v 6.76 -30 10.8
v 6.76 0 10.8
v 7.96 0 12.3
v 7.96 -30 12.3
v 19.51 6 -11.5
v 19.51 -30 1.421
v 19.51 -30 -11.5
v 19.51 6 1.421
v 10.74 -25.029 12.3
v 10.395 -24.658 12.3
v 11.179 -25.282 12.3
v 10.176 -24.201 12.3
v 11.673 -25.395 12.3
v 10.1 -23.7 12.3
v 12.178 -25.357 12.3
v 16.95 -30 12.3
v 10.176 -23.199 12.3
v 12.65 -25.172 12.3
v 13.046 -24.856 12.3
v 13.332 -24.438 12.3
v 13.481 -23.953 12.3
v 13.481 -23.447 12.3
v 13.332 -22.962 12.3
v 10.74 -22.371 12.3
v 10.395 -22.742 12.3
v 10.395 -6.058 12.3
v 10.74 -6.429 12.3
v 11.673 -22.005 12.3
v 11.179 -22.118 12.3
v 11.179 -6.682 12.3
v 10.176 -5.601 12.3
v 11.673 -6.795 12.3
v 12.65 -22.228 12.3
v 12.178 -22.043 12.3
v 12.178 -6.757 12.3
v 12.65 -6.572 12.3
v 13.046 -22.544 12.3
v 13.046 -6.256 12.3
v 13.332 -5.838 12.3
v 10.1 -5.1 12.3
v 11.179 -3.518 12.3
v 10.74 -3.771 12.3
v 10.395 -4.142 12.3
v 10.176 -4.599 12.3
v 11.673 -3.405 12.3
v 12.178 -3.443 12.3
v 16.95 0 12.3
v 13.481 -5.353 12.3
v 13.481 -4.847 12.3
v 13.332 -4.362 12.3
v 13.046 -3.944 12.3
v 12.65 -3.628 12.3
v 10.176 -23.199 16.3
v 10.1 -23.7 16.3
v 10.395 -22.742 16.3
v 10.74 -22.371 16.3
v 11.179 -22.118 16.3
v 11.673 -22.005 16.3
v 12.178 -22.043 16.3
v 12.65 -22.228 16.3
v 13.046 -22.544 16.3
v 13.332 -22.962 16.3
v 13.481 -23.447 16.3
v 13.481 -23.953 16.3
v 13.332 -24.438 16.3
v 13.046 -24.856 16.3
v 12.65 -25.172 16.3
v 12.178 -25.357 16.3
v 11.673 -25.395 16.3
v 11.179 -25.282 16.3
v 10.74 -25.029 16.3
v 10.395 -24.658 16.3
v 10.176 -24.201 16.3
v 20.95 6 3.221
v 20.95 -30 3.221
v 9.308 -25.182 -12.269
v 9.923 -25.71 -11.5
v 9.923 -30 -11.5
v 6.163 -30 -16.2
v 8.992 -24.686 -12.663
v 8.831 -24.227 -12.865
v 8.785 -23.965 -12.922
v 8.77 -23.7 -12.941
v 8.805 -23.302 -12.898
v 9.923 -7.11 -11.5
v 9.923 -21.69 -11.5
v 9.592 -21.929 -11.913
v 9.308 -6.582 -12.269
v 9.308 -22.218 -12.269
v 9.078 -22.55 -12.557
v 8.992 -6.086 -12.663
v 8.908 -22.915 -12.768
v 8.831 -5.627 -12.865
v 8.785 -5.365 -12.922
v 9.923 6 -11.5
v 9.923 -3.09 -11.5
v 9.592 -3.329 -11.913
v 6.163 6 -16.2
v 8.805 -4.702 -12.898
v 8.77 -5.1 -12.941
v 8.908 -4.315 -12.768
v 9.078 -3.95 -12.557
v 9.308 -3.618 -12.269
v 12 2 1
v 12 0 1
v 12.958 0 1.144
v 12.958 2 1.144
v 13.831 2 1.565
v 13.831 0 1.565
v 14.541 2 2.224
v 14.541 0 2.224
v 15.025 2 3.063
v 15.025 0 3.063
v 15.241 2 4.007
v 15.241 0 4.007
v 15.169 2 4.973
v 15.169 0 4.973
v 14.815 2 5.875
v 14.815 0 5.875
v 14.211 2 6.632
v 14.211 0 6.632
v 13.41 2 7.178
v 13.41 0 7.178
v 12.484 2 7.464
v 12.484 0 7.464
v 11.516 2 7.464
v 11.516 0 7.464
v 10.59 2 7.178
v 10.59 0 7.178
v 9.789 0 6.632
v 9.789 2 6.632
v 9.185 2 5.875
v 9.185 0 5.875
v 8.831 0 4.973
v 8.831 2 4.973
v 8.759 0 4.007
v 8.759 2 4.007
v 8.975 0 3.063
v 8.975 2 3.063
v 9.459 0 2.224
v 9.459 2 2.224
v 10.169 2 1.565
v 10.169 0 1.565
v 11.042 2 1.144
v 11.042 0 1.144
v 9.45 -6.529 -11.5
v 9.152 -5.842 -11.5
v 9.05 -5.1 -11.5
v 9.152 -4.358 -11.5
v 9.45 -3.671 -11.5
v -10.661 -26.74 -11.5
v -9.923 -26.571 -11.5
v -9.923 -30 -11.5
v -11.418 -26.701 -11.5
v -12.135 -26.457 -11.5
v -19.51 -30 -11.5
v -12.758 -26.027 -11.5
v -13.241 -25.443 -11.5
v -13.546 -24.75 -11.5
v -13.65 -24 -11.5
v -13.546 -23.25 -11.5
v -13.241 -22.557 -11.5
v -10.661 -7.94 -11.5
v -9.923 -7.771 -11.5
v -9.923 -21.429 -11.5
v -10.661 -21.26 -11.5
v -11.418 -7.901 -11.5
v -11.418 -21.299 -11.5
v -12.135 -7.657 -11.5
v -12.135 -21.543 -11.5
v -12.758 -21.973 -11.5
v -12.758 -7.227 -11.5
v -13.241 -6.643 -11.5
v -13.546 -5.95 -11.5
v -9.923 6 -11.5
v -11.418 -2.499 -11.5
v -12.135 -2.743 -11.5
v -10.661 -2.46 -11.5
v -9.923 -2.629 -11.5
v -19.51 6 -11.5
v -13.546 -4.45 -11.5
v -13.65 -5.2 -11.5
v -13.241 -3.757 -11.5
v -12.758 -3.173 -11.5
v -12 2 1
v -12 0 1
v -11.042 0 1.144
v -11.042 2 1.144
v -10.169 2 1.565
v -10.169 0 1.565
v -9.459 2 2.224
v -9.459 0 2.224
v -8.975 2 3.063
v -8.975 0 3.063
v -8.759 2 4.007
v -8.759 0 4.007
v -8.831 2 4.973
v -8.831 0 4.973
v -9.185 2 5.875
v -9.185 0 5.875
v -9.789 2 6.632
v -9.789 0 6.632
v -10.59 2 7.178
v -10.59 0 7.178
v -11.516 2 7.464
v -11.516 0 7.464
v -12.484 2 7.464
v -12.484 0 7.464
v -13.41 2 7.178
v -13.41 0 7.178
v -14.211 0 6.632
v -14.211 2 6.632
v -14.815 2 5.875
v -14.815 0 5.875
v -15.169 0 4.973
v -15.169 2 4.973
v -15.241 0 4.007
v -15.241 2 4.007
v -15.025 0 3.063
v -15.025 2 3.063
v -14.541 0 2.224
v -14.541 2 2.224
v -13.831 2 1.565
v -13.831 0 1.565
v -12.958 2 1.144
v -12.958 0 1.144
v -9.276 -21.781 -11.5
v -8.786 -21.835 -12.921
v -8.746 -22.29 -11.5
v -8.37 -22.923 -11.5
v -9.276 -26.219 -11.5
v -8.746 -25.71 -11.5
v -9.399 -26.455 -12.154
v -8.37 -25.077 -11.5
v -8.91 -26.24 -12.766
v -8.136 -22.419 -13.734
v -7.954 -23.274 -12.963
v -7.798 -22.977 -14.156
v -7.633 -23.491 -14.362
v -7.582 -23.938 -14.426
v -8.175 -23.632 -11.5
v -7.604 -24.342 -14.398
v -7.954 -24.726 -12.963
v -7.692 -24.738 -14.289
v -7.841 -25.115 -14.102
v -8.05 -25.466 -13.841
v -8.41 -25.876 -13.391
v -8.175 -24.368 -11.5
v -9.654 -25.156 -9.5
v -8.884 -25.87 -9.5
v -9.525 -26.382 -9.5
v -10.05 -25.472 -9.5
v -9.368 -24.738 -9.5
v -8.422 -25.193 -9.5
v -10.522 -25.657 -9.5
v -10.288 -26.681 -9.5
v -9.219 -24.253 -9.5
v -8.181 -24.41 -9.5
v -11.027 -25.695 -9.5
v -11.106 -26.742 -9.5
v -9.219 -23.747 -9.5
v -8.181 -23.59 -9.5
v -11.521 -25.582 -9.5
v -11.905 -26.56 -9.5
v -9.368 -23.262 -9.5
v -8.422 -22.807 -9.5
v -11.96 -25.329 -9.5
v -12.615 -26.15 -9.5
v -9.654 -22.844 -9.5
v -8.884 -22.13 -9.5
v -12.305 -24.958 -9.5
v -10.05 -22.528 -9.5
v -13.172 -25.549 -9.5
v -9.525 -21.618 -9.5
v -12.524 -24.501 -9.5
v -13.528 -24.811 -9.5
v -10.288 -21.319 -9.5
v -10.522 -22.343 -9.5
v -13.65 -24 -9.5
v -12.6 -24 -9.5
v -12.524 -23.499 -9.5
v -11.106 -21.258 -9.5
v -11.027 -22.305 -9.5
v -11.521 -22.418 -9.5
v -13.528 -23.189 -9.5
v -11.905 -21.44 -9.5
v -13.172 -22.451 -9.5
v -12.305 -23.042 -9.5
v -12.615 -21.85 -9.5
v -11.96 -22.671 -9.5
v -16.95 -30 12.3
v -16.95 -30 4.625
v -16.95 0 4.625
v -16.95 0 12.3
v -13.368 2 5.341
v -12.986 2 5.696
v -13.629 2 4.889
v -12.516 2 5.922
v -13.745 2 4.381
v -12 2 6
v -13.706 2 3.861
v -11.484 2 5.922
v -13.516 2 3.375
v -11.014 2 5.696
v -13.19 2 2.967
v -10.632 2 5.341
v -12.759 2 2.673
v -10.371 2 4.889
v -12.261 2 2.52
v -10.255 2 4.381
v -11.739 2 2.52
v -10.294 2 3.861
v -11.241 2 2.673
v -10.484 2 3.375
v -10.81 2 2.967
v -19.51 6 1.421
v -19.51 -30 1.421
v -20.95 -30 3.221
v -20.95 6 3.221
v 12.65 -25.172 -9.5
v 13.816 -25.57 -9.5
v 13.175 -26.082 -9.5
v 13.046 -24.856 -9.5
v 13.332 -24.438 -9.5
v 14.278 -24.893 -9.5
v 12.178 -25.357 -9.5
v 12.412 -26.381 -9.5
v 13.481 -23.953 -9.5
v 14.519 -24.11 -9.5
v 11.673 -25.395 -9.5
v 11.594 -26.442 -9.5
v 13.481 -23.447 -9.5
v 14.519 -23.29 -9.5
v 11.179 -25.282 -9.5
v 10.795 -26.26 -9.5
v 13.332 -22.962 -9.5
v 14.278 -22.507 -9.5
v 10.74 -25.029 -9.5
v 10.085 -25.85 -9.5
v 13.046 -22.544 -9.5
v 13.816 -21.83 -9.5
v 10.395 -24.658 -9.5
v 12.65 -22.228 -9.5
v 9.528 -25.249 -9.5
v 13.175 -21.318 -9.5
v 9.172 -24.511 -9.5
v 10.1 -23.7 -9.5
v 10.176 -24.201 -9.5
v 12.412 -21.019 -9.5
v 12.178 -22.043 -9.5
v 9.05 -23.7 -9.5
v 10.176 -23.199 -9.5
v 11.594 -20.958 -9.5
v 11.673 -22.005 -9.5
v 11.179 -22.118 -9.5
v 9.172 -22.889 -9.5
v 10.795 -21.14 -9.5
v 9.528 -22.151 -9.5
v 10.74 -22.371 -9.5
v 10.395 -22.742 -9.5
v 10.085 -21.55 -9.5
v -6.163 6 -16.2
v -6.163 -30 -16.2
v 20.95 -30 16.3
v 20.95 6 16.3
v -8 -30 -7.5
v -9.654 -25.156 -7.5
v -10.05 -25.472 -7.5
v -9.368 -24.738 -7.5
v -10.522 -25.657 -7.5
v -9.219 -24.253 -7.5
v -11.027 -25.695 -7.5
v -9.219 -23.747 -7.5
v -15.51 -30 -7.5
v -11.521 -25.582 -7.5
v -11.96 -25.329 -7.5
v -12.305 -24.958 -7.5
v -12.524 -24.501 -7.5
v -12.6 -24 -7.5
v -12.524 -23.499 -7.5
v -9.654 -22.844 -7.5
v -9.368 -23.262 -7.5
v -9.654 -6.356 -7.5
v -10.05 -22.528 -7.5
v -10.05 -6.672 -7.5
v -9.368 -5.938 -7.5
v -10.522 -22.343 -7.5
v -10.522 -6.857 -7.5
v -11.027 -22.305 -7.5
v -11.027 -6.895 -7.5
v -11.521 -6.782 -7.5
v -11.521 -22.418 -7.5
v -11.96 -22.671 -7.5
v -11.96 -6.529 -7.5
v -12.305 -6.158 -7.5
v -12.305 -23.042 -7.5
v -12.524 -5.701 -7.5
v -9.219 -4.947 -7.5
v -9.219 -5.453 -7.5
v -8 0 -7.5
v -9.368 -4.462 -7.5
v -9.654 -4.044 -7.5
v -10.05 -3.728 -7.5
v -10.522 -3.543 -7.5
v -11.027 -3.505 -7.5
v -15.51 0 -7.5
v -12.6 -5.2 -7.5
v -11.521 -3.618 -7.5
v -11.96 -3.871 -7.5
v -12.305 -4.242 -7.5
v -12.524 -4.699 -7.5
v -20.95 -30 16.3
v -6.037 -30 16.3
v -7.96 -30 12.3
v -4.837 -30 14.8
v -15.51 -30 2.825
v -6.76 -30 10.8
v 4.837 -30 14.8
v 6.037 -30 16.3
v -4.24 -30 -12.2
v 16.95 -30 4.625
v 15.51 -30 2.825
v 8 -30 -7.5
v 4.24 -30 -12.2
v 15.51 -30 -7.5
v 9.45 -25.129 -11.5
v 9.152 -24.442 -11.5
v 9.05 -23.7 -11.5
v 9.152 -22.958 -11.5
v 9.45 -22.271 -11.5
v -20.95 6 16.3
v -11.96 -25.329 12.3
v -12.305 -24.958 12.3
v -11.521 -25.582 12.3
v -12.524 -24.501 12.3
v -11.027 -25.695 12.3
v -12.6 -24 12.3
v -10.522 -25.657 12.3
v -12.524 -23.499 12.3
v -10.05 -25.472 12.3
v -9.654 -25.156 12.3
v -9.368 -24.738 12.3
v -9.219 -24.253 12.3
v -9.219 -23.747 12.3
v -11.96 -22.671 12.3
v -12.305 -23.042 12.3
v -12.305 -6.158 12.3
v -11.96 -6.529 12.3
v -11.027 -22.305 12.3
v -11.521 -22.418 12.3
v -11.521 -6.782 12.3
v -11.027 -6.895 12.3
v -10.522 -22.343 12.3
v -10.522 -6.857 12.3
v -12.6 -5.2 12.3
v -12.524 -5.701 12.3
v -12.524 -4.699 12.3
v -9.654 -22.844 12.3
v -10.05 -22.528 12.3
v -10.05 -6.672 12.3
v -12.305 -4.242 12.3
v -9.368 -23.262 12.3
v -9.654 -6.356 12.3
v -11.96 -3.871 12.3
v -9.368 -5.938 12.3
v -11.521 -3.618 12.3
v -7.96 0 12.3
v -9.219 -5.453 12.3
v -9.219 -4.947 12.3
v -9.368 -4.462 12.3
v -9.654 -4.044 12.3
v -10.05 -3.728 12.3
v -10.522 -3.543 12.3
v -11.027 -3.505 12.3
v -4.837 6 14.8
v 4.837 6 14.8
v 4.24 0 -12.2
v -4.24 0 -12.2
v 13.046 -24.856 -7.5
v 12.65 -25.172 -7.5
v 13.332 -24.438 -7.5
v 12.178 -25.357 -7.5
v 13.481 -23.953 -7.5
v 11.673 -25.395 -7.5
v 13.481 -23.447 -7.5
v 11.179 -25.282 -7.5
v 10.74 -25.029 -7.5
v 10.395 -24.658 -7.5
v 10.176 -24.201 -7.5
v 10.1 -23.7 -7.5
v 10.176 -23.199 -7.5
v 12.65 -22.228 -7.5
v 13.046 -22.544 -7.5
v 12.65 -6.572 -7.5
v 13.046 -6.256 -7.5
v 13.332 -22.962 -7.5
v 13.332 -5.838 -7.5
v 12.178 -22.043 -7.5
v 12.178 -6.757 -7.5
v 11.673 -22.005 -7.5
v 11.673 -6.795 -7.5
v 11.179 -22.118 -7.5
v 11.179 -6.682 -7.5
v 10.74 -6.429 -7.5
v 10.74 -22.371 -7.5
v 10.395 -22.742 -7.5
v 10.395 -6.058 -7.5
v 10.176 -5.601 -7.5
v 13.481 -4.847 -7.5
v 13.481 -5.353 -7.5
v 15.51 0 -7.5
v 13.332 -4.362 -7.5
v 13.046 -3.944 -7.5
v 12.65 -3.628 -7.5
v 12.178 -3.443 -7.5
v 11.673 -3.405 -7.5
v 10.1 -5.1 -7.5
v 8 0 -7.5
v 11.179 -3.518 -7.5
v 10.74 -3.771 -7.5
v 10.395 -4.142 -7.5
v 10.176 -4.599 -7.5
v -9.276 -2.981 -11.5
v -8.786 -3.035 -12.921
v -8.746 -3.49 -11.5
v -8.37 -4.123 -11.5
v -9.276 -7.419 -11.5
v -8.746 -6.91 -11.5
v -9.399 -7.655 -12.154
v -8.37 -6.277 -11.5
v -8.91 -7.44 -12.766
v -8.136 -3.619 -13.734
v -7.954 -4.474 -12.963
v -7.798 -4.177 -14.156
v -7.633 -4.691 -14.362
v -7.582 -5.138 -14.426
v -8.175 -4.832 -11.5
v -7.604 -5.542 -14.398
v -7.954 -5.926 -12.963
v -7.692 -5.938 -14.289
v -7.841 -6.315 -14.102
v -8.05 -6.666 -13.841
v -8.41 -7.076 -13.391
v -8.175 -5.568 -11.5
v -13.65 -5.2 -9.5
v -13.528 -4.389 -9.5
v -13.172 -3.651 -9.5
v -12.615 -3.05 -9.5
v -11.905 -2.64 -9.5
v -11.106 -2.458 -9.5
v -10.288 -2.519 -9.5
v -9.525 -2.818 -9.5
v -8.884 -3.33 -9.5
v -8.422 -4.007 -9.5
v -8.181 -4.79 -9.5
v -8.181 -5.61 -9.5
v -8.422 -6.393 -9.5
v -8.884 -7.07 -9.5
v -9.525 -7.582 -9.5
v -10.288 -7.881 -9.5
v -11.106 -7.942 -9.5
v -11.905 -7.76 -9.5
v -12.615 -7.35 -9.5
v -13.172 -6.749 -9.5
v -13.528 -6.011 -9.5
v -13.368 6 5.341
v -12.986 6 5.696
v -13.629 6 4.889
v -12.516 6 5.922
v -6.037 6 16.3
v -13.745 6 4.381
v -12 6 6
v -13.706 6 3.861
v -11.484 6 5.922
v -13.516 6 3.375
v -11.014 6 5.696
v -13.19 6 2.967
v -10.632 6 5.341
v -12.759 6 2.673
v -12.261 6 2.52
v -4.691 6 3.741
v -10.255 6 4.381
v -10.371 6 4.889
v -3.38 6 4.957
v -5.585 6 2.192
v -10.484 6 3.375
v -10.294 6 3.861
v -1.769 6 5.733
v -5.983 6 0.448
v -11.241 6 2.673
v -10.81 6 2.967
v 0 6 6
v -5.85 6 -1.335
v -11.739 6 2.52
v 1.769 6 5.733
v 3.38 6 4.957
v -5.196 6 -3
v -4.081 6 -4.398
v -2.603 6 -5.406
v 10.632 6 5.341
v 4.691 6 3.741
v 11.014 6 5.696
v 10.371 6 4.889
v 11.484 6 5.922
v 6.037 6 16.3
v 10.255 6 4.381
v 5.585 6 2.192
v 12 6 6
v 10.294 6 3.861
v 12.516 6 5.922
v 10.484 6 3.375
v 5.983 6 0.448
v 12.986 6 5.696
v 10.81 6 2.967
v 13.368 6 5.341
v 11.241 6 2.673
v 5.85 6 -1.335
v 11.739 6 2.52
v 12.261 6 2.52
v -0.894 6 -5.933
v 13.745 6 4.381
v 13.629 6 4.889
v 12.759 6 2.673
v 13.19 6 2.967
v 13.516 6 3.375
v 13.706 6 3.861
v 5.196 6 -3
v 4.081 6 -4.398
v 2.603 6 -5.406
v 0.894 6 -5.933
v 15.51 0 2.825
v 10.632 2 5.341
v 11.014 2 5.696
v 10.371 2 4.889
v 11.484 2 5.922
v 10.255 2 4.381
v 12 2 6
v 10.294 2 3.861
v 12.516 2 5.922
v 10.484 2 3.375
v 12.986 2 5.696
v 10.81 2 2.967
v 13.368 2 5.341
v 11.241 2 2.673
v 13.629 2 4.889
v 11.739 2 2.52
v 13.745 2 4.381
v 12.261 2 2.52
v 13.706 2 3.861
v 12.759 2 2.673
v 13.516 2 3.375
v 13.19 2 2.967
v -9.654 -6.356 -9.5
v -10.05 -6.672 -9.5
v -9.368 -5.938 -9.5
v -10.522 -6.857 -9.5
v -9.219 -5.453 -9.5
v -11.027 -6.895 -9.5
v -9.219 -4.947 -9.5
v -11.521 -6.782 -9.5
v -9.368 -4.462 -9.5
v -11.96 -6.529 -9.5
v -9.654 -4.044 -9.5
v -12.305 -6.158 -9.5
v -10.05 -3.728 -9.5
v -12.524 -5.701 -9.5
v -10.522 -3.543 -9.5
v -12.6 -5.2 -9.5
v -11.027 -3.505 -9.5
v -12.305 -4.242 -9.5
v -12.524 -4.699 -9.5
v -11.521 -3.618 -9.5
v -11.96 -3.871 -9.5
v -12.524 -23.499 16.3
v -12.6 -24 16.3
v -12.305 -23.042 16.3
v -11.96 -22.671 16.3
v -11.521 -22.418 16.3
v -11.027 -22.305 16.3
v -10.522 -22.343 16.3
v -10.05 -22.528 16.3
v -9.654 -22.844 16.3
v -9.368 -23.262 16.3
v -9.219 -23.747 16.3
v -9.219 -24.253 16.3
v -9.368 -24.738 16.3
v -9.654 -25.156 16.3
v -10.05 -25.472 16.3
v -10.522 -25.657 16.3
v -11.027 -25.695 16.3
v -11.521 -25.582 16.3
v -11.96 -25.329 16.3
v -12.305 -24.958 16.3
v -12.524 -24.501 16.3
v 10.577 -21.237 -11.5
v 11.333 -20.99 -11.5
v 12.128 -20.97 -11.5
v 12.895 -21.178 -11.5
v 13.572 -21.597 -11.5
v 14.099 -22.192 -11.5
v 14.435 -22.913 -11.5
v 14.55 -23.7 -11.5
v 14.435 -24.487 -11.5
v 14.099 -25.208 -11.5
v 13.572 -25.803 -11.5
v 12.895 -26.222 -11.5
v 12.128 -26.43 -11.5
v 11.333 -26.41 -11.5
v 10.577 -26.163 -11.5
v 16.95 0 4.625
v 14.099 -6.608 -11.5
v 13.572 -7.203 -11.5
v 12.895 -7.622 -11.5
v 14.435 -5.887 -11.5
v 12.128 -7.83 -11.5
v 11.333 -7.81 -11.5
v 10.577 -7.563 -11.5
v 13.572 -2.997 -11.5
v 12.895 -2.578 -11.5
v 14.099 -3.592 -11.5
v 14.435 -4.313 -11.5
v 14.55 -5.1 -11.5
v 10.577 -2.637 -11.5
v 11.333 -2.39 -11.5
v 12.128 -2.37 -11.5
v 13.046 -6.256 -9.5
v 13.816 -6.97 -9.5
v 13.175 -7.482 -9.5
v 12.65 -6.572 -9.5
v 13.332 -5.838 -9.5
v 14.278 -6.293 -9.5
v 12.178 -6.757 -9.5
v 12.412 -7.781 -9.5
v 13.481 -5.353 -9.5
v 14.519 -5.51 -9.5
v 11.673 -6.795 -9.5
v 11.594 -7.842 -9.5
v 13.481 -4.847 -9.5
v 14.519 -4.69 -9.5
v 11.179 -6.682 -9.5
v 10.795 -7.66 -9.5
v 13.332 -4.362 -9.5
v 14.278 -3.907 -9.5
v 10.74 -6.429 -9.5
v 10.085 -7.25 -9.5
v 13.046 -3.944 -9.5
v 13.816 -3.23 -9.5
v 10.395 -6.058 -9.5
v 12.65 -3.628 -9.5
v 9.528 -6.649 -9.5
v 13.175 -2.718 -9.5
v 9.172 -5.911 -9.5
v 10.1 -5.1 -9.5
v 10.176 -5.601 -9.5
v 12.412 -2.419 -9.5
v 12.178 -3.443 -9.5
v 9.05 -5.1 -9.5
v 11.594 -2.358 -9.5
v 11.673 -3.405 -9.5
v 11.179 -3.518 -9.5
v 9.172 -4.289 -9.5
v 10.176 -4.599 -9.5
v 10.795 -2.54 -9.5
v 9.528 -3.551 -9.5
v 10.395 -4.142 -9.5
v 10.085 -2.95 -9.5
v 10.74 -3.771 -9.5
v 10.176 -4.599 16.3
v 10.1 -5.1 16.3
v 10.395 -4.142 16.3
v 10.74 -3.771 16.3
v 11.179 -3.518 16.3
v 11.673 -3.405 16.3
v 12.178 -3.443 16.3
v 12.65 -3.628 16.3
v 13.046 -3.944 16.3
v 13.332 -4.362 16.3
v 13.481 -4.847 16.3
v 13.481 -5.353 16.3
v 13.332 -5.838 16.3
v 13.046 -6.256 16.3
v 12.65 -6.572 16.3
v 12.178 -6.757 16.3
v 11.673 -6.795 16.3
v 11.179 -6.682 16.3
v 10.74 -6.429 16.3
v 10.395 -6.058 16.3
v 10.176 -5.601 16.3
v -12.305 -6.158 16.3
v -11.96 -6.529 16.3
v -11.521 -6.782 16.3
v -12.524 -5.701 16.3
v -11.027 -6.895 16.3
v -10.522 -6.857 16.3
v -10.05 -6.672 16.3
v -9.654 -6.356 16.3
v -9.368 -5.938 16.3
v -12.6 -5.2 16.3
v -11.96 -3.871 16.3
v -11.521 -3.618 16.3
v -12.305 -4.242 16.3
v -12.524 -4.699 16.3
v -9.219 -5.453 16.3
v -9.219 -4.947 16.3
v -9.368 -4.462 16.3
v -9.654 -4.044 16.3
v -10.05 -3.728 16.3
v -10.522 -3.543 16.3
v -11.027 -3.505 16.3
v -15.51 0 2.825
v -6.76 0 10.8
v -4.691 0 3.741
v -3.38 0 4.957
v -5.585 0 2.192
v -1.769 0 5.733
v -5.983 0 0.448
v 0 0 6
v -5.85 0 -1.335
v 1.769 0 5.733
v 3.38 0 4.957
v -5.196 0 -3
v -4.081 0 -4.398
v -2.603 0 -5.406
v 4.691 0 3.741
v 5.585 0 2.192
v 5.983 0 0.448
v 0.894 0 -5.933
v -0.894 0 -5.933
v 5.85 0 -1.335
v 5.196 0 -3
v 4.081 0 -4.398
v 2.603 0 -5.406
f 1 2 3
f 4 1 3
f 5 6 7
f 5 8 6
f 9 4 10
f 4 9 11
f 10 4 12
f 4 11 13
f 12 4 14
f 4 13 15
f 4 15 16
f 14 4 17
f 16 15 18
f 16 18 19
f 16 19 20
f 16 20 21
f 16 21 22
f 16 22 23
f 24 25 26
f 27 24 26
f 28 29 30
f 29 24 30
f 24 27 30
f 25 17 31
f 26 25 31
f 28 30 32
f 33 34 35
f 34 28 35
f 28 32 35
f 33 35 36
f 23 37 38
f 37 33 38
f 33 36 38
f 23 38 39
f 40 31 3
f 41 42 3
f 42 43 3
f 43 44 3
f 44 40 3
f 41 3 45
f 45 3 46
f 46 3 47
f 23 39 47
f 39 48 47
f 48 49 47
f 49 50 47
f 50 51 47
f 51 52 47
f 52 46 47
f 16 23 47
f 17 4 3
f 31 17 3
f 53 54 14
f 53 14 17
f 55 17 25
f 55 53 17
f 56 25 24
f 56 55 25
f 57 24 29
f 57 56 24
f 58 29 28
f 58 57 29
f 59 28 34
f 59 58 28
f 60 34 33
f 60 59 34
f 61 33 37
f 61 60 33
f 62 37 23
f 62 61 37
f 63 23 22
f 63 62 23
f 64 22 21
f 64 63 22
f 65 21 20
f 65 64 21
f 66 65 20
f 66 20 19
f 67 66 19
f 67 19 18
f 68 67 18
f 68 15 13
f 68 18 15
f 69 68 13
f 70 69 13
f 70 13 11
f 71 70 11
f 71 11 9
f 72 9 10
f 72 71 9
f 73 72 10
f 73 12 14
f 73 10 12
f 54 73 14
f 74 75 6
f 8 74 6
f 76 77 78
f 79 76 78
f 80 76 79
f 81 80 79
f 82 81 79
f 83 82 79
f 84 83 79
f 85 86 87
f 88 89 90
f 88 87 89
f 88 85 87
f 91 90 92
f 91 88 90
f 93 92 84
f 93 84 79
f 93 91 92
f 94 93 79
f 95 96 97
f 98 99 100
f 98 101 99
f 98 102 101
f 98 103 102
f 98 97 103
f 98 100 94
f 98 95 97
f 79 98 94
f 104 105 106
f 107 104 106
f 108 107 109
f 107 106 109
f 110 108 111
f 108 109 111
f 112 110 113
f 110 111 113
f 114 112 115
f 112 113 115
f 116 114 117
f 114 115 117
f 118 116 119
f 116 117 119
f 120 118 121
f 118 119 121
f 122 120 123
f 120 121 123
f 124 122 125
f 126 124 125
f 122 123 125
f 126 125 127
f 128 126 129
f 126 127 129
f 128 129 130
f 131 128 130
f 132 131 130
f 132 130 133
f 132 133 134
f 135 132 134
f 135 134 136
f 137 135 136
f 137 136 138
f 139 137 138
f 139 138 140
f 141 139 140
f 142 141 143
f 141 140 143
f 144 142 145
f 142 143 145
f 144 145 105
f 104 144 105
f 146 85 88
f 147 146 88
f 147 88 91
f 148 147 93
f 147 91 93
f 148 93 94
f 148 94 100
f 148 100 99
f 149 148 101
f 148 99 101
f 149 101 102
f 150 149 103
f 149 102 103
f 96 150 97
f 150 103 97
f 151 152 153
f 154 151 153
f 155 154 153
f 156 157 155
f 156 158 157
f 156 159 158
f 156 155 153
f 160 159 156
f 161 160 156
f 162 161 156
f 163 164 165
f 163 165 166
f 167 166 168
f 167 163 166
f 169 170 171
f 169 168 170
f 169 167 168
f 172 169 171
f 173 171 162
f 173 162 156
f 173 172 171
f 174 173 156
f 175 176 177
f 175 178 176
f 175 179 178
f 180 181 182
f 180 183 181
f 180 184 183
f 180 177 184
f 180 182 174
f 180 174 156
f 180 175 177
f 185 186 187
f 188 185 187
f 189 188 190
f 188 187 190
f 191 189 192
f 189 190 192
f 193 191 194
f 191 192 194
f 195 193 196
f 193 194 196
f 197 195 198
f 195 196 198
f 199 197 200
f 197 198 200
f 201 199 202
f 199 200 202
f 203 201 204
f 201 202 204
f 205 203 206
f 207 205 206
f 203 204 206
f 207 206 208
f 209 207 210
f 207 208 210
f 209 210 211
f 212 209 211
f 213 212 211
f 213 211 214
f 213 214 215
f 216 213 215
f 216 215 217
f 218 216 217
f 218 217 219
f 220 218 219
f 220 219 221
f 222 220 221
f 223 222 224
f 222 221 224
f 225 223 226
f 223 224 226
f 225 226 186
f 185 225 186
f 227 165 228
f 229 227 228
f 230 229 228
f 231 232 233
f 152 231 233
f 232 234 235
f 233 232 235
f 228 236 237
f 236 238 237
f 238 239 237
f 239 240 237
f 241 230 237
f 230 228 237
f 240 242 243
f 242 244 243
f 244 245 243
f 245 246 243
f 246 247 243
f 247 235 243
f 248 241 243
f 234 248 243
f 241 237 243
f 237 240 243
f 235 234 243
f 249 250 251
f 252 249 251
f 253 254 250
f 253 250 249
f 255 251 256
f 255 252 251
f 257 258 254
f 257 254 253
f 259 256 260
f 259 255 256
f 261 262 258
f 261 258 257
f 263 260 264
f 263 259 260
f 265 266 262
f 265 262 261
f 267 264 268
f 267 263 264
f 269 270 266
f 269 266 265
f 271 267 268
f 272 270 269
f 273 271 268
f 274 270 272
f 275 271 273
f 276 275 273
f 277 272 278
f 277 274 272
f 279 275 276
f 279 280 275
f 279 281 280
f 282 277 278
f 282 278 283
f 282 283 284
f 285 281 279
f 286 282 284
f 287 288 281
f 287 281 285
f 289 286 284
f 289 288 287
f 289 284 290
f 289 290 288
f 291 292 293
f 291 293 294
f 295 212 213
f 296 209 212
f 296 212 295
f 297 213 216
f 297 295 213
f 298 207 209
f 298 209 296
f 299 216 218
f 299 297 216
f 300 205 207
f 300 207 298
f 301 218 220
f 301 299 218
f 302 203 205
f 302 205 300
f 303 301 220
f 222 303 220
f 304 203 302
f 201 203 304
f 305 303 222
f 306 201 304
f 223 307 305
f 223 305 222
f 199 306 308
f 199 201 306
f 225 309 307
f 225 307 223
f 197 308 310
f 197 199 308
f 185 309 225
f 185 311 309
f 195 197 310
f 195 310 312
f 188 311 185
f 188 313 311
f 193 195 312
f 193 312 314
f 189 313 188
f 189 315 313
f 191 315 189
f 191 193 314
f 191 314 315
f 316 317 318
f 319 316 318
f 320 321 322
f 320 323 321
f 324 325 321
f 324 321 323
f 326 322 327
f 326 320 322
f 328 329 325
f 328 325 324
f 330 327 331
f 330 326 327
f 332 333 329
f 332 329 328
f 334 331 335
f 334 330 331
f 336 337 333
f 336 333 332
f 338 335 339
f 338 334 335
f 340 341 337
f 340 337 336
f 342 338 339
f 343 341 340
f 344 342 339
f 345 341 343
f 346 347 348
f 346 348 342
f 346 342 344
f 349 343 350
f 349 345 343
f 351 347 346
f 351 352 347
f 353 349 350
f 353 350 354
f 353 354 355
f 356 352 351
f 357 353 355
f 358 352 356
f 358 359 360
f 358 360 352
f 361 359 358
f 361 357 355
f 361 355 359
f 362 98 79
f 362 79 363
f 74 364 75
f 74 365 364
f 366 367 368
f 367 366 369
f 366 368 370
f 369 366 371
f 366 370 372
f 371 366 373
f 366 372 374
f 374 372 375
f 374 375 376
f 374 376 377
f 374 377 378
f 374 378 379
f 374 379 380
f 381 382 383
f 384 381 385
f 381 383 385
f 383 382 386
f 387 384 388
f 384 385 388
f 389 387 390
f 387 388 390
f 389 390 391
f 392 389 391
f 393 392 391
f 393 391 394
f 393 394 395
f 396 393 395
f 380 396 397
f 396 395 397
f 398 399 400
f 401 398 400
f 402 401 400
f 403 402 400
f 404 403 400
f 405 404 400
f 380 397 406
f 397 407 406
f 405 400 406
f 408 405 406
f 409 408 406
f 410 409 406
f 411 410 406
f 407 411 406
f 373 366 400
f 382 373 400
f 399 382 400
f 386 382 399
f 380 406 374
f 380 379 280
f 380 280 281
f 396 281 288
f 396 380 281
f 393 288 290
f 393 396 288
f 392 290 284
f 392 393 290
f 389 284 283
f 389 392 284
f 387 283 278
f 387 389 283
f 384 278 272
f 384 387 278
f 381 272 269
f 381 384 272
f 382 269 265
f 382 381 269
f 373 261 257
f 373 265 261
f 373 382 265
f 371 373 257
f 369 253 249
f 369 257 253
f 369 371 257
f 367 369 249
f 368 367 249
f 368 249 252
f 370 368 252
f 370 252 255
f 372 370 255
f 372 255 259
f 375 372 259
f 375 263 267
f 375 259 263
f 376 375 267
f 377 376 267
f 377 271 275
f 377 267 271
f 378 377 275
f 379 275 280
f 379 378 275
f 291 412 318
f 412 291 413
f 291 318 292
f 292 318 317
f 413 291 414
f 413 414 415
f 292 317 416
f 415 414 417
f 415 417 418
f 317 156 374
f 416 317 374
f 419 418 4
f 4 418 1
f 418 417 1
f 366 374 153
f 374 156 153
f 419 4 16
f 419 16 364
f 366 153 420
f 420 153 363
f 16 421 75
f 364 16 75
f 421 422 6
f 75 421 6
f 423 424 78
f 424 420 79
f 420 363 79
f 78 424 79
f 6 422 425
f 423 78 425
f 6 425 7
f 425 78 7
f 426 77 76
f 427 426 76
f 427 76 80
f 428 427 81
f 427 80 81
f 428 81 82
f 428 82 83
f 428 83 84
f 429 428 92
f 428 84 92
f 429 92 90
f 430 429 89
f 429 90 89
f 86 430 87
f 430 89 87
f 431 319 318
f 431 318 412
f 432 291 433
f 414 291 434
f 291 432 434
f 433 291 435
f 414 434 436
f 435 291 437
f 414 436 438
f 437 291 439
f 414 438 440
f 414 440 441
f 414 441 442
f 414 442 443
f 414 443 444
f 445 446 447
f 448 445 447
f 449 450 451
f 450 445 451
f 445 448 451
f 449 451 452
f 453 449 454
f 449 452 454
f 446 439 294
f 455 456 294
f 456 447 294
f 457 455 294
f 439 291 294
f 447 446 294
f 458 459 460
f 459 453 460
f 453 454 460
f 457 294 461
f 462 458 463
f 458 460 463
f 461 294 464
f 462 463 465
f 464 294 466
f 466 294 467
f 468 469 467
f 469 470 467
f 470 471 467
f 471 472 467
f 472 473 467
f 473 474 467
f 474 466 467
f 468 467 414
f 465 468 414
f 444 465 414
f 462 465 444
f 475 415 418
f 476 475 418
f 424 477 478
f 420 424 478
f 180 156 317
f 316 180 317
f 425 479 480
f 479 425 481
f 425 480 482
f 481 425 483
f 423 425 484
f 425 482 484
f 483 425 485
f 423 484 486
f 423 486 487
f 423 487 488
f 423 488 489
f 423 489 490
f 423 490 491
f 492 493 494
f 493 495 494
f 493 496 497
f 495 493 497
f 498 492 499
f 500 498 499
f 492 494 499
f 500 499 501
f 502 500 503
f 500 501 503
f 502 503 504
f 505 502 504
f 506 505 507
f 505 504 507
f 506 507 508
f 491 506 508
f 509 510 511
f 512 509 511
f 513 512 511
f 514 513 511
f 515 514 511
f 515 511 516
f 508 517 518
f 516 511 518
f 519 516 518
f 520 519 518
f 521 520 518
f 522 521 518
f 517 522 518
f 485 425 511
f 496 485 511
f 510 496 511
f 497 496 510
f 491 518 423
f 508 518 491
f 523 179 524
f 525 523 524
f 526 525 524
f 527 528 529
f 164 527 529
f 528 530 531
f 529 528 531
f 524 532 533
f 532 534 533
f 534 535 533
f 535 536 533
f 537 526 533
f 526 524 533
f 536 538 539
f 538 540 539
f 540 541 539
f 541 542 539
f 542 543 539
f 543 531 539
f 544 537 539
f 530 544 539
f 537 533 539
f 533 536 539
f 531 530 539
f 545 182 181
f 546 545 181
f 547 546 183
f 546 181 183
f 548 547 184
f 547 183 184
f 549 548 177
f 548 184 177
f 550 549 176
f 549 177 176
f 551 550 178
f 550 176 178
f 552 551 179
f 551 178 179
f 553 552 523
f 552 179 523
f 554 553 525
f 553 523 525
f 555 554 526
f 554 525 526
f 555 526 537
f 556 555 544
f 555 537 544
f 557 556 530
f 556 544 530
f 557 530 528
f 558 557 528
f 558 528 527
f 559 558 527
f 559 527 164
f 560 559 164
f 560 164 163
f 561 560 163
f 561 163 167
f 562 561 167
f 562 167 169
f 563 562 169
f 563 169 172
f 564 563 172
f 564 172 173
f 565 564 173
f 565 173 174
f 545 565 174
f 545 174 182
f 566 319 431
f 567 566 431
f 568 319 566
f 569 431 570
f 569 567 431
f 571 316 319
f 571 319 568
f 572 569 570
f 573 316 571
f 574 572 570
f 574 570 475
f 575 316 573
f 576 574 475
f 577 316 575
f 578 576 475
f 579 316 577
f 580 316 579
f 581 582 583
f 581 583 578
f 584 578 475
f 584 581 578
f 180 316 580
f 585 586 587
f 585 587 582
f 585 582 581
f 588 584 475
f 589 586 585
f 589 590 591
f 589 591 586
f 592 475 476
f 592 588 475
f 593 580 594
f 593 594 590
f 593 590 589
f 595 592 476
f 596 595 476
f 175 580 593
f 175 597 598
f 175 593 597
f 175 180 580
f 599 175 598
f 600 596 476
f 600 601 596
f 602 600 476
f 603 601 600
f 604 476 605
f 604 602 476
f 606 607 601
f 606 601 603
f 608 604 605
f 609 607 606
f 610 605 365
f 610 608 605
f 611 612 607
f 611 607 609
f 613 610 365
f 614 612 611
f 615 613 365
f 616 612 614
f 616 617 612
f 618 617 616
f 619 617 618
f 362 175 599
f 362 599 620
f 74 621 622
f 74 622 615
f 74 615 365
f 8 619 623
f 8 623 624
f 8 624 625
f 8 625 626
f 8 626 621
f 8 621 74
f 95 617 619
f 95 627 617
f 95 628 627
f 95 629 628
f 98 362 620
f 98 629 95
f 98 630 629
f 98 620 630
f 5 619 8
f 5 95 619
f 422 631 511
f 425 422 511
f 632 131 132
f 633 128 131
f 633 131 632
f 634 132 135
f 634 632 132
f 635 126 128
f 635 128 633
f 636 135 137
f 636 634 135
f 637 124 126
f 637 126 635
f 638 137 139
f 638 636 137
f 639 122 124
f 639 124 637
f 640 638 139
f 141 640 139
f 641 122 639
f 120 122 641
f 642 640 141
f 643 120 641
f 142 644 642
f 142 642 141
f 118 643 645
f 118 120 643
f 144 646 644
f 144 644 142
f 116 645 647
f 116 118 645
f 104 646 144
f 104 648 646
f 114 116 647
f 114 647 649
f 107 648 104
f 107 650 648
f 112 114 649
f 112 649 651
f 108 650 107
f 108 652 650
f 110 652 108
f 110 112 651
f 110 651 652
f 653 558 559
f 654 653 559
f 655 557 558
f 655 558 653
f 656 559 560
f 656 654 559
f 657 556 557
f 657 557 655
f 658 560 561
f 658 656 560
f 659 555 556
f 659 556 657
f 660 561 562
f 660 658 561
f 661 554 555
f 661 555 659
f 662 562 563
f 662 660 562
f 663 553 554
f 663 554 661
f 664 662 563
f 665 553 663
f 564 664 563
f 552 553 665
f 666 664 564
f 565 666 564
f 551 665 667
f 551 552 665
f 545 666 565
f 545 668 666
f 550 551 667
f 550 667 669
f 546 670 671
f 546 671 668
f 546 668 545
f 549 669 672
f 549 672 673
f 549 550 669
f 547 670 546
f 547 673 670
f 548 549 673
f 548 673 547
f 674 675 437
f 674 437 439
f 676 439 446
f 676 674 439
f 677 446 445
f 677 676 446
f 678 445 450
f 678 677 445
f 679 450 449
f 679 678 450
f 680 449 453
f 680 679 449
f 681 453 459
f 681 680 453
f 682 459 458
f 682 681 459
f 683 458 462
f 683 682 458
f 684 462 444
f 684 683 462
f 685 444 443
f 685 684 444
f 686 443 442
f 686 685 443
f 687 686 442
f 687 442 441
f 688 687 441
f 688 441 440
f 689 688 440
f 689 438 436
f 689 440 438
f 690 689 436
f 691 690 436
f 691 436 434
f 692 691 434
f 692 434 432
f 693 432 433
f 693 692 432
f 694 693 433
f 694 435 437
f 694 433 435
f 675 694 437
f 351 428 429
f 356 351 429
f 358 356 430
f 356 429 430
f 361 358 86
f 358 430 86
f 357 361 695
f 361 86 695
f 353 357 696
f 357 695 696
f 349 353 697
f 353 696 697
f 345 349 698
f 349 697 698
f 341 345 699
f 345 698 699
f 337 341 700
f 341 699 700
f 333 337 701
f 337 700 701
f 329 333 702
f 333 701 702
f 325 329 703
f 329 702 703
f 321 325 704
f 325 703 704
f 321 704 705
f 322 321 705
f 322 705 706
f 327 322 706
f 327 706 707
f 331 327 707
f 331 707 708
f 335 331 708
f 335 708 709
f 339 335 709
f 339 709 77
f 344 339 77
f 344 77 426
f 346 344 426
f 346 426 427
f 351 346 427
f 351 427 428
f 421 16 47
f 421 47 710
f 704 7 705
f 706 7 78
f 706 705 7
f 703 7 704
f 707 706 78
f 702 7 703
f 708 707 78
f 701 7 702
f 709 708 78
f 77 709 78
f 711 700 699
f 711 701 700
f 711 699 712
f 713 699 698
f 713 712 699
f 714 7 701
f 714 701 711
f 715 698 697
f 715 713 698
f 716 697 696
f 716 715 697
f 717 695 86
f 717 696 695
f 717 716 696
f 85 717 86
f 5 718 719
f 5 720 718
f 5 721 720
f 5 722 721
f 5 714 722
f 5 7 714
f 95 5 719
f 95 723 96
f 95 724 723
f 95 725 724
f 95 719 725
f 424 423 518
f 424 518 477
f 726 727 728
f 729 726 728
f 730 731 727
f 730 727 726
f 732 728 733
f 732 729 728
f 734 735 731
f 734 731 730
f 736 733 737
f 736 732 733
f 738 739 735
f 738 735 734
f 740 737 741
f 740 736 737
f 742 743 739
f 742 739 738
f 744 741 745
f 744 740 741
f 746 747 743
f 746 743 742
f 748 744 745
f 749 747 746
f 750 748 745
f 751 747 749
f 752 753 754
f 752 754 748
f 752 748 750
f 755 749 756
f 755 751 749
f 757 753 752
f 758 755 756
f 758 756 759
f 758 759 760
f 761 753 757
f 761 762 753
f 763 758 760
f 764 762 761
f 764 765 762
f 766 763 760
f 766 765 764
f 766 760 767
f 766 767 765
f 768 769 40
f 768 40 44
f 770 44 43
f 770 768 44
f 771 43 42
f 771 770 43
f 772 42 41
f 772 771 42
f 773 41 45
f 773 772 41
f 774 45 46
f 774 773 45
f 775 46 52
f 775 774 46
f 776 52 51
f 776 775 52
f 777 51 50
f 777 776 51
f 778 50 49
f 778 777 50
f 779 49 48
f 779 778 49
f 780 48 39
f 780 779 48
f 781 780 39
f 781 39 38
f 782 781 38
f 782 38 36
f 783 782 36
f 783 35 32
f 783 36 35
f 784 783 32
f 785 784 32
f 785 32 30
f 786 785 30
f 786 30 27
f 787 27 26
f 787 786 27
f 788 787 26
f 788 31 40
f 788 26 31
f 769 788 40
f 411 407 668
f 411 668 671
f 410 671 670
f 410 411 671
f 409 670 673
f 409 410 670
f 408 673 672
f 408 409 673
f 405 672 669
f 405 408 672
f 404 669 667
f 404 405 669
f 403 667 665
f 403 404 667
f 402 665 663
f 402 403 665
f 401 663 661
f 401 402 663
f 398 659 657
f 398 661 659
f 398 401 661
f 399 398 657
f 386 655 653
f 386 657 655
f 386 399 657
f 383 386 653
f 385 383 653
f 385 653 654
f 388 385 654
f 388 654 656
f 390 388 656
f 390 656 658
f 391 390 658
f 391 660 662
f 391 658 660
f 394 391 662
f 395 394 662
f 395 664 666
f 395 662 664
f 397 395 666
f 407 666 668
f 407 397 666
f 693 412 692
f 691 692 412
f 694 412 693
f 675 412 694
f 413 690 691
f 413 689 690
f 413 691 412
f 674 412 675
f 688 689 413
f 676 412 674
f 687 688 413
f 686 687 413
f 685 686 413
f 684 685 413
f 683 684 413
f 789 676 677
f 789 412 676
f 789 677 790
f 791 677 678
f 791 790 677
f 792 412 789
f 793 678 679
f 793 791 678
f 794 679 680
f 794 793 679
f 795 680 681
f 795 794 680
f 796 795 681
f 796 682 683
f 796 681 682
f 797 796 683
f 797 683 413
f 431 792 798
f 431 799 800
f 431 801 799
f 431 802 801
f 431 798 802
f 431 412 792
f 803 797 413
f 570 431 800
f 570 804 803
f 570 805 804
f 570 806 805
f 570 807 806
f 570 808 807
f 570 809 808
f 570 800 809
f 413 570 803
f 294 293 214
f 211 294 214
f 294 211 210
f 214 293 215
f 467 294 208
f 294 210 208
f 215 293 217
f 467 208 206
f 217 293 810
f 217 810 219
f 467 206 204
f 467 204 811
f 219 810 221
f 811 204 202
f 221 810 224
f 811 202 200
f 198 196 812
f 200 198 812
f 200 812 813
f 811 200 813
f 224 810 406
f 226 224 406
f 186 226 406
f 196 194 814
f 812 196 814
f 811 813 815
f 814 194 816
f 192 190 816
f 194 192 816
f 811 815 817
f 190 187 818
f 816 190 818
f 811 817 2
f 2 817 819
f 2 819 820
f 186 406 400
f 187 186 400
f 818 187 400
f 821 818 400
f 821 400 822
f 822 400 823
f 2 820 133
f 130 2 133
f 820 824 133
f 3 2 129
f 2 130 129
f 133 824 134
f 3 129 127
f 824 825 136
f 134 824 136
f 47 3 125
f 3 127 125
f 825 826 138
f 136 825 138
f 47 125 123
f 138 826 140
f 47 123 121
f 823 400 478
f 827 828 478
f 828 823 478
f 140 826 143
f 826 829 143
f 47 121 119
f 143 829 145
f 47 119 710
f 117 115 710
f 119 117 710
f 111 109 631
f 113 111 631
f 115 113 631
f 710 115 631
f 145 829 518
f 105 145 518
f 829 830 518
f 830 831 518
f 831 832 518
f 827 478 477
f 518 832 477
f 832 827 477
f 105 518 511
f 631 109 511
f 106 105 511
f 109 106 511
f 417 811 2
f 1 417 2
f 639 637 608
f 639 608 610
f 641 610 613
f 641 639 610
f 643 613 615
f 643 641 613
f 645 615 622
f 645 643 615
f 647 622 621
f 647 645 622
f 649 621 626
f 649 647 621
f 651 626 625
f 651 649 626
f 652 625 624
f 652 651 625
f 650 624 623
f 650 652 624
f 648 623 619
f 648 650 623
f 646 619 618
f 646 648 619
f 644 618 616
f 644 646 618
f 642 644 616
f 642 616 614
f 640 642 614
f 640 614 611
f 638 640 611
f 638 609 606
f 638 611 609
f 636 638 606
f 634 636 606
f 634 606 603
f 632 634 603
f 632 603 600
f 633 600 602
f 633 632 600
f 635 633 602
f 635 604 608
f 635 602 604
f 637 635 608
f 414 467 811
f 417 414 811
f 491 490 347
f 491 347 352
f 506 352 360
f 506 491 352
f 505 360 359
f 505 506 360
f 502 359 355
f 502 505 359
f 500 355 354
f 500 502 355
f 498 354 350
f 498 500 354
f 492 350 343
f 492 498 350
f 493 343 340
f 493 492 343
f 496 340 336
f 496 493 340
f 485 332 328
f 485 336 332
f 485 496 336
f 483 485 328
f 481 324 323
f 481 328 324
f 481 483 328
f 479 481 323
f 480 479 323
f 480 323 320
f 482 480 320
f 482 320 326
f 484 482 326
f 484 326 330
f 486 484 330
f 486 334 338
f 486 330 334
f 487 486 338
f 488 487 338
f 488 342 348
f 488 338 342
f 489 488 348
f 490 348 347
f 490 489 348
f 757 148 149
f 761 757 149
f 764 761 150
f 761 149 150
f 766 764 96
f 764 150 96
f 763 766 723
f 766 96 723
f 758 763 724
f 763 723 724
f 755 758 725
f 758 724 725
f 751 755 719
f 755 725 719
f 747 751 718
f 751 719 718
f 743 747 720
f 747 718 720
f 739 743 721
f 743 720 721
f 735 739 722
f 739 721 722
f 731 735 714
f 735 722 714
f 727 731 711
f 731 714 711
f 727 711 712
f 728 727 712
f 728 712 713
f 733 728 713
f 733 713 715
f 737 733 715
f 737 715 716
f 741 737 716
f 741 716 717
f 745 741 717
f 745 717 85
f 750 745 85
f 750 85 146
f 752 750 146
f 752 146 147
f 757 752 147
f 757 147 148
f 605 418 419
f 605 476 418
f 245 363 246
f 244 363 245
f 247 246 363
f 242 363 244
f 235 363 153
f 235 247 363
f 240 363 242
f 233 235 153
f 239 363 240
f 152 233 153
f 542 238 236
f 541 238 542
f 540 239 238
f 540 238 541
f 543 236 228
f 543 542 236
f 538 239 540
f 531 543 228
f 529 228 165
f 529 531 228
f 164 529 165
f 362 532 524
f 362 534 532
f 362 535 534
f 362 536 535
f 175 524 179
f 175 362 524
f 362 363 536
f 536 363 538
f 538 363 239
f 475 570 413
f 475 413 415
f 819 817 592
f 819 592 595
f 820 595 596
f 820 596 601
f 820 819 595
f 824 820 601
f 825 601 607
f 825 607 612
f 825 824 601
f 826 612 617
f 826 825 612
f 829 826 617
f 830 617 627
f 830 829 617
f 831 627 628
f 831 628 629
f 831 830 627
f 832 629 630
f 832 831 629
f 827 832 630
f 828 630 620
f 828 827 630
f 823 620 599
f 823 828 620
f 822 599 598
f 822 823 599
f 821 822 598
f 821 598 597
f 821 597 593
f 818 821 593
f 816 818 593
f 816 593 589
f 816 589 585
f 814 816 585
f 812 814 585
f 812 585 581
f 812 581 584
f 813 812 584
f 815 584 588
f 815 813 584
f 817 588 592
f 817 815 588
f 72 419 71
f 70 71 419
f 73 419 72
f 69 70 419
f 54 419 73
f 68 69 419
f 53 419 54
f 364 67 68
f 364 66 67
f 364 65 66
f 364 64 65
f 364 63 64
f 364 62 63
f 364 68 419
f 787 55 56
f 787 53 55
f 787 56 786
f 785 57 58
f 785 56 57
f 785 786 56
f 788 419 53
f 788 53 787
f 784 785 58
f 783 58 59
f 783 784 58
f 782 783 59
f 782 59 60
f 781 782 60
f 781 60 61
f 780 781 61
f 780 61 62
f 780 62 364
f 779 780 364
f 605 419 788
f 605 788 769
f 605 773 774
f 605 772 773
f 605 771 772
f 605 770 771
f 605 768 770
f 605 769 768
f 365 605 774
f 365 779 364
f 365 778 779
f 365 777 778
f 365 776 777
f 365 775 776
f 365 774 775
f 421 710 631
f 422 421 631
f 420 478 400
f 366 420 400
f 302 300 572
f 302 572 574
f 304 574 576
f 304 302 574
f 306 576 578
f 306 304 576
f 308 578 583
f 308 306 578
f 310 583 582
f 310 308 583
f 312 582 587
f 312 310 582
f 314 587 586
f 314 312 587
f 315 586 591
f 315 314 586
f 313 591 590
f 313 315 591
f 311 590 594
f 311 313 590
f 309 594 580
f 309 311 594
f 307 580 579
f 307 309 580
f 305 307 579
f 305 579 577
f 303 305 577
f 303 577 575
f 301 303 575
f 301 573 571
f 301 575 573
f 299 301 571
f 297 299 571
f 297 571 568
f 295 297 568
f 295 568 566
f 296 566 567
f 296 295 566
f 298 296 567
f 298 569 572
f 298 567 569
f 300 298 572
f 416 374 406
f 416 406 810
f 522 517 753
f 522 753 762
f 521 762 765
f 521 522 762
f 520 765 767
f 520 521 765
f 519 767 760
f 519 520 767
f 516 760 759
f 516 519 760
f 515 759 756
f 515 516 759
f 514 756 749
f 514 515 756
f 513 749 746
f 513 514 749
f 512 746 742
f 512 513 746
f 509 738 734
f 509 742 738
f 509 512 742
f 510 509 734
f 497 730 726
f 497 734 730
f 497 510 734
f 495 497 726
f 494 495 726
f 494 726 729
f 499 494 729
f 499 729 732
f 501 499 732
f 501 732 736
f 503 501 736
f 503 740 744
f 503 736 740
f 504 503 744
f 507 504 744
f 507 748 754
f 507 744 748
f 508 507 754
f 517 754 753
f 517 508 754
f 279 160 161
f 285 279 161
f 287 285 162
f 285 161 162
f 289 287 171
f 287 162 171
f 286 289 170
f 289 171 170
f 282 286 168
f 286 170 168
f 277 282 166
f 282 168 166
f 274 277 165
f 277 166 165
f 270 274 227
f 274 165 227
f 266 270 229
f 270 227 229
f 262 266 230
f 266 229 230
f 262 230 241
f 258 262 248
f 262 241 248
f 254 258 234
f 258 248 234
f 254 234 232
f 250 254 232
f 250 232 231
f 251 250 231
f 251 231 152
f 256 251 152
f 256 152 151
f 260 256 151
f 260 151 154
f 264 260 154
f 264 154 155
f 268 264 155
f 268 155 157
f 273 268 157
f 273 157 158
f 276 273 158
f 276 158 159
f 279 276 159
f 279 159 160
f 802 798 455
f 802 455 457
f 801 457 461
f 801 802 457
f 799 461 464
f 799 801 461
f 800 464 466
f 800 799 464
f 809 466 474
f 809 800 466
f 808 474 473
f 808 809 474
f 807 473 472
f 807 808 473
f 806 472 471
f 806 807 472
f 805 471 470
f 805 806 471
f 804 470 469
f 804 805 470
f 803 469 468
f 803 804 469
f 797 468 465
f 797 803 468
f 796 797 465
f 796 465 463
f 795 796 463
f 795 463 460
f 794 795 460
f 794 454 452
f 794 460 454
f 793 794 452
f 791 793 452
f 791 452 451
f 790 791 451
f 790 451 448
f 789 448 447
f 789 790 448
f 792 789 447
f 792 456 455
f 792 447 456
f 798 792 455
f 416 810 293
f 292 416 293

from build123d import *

# Parameters (mm, degrees)
SKETCH2_R                    = 6
BOSS_EXTRUDE1_DEPTH          = 6
BOSS_EXTRUDE2_DEPTH          = 30
CUT_EXTRUDE1_DEPTH           = 47.38051854
CUT_EXTRUDE1_DEPTH_BACK      = 47.38051854
SKETCH3_R                    = 1.7
SKETCH4_R                    = 2.75
CUT_EXTRUDE2_DEPTH           = 2
CUT_EXTRUDE2_OTHER_WAY_DEPTH = 10
CUT_EXTRUDE2_OTHER_WAY_TAPER = -11
CUT_EXTRUDE3_DEPTH           = 45.727983411
CUT_EXTRUDE3_DEPTH_BACK      = 45.727983411
SKETCH6_R                    = 1.75
SKETCH7_R                    = 3.25
CUT_EXTRUDE4_DEPTH           = 2


with BuildPart() as part:
    # Sketch2 → Boss-Extrude1 (new body)
    with BuildSketch(Plane(origin=(0, 0, 0), x_dir=(1, 0, 0), z_dir=(0, 1, 0))):
        Polygon((-6.162811814, 16.2), (-9.922811814, 11.5), (-19.51, 11.5), (-19.51, -1.421485233), (-20.95, -3.221485233), (-20.95, -16.3), (-6.037188186, -16.3), (-4.837188186, -14.8), (4.837188186, -14.8), (6.037188186, -16.3), (20.95, -16.3), (20.95, -3.221485233), (19.51, -1.421485233), (19.51, 11.5), (9.922811814, 11.5), (6.162811814, 16.2), align=None)
        with Locations(Location((0, 0, 0), (0, 0, 270))):
            Circle(SKETCH2_R, mode=Mode.SUBTRACT)
    extrude(amount=BOSS_EXTRUDE1_DEPTH)

    # Sketch2<3> → Boss-Extrude2 (add)
    with BuildSketch(Plane(origin=(0, 0, 0), x_dir=(1, 0, 0), z_dir=(0, 1, 0))):
        Polygon((9.922811814, 11.5), (6.162811814, 16.2), (-6.162811814, 16.2), (-9.922811814, 11.5), (-19.51, 11.5), (-19.51, -1.421485233), (-20.95, -3.221485233), (-20.95, -16.3), (-6.037188186, -16.3), (-4.837188186, -14.8), (4.837188186, -14.8), (6.037188186, -16.3), (20.95, -16.3), (20.95, -3.221485233), (19.51, -1.421485233), (19.51, 11.5), align=None)
        Polygon((4.240312424, 12.2), (-4.240312424, 12.2), (-8.000312424, 7.5), (-15.51, 7.5), (-15.51, -2.82460947), (-16.95, -4.62460947), (-16.95, -12.3), (-7.959687576, -12.3), (-6.759687576, -10.8), (6.759687576, -10.8), (7.959687576, -12.3), (16.95, -12.3), (16.95, -4.62460947), (15.51, -2.82460947), (15.51, 7.5), (8.000312424, 7.5), align=None, mode=Mode.SUBTRACT)
    extrude(amount=-BOSS_EXTRUDE2_DEPTH)

    # Sketch3 → Cut-Extrude1 (cut, two sides: drawn at the far end of the back side and taken through both)
    with BuildSketch(Plane(origin=(0, 0, 12.3), x_dir=(-1, 0, 0), z_dir=(0, 0, -1)).offset(-CUT_EXTRUDE1_DEPTH_BACK)):
        with Locations((10.9, -5.2)):
            Circle(SKETCH3_R)
        with Locations((10.9, -24)):
            Circle(SKETCH3_R)
        with Locations((-11.8, -23.7)):
            Circle(SKETCH3_R)
        with Locations((-11.8, -5.1)):
            Circle(SKETCH3_R)
    extrude(amount=CUT_EXTRUDE1_DEPTH + CUT_EXTRUDE1_DEPTH_BACK, mode=Mode.SUBTRACT)

    # Sketch4 → Cut-Extrude2 (cut)
    with BuildSketch(Plane(origin=(0, 0, -11.5), x_dir=(-1, 0, 0), z_dir=(0, 0, -1))):
        with Locations((-11.8, -5.1)):
            Circle(SKETCH4_R)
        with Locations((10.9, -5.2)):
            Circle(SKETCH4_R)
        with Locations((-11.8, -23.7)):
            Circle(SKETCH4_R)
        with Locations((10.9, -24)):
            Circle(SKETCH4_R)
    extrude(amount=-CUT_EXTRUDE2_DEPTH, mode=Mode.SUBTRACT)

    # Sketch4 → Cut-Extrude2 other way (cut)
    with BuildSketch(Plane(origin=(0, 0, -11.5), x_dir=(-1, 0, 0), z_dir=(0, 0, -1))):
        with Locations((-11.8, -5.1)):
            Circle(SKETCH4_R)
        with Locations((10.9, -5.2)):
            Circle(SKETCH4_R)
        with Locations((-11.8, -23.7)):
            Circle(SKETCH4_R)
        with Locations((10.9, -24)):
            Circle(SKETCH4_R)
    extrude(amount=CUT_EXTRUDE2_OTHER_WAY_DEPTH, taper=CUT_EXTRUDE2_OTHER_WAY_TAPER, mode=Mode.SUBTRACT)

    # Sketch6 → Cut-Extrude3 (cut, two sides: drawn at the far end of the back side and taken through both)
    with BuildSketch(Plane(origin=(0, 6, 0), x_dir=(1, 0, 0), z_dir=(0, 1, 0)).offset(-CUT_EXTRUDE3_DEPTH_BACK)):
        with Locations(Location((-12, -4.25, 0), (0, 0, 270))):
            Circle(SKETCH6_R)
        with Locations(Location((12, -4.25, 0), (0, 0, 270))):
            Circle(SKETCH6_R)
    extrude(amount=CUT_EXTRUDE3_DEPTH + CUT_EXTRUDE3_DEPTH_BACK, mode=Mode.SUBTRACT)

    # Sketch7 → Cut-Extrude4 (cut)
    with BuildSketch(Plane.XZ):
        with Locations(Location((-12, 4.25, 0), (0, 0, 270))):
            Circle(SKETCH7_R)
        with Locations(Location((12, 4.25, 0), (0, 0, 270))):
            Circle(SKETCH7_R)
    extrude(amount=-CUT_EXTRUDE4_DEPTH, mode=Mode.SUBTRACT)


solid = part.part
